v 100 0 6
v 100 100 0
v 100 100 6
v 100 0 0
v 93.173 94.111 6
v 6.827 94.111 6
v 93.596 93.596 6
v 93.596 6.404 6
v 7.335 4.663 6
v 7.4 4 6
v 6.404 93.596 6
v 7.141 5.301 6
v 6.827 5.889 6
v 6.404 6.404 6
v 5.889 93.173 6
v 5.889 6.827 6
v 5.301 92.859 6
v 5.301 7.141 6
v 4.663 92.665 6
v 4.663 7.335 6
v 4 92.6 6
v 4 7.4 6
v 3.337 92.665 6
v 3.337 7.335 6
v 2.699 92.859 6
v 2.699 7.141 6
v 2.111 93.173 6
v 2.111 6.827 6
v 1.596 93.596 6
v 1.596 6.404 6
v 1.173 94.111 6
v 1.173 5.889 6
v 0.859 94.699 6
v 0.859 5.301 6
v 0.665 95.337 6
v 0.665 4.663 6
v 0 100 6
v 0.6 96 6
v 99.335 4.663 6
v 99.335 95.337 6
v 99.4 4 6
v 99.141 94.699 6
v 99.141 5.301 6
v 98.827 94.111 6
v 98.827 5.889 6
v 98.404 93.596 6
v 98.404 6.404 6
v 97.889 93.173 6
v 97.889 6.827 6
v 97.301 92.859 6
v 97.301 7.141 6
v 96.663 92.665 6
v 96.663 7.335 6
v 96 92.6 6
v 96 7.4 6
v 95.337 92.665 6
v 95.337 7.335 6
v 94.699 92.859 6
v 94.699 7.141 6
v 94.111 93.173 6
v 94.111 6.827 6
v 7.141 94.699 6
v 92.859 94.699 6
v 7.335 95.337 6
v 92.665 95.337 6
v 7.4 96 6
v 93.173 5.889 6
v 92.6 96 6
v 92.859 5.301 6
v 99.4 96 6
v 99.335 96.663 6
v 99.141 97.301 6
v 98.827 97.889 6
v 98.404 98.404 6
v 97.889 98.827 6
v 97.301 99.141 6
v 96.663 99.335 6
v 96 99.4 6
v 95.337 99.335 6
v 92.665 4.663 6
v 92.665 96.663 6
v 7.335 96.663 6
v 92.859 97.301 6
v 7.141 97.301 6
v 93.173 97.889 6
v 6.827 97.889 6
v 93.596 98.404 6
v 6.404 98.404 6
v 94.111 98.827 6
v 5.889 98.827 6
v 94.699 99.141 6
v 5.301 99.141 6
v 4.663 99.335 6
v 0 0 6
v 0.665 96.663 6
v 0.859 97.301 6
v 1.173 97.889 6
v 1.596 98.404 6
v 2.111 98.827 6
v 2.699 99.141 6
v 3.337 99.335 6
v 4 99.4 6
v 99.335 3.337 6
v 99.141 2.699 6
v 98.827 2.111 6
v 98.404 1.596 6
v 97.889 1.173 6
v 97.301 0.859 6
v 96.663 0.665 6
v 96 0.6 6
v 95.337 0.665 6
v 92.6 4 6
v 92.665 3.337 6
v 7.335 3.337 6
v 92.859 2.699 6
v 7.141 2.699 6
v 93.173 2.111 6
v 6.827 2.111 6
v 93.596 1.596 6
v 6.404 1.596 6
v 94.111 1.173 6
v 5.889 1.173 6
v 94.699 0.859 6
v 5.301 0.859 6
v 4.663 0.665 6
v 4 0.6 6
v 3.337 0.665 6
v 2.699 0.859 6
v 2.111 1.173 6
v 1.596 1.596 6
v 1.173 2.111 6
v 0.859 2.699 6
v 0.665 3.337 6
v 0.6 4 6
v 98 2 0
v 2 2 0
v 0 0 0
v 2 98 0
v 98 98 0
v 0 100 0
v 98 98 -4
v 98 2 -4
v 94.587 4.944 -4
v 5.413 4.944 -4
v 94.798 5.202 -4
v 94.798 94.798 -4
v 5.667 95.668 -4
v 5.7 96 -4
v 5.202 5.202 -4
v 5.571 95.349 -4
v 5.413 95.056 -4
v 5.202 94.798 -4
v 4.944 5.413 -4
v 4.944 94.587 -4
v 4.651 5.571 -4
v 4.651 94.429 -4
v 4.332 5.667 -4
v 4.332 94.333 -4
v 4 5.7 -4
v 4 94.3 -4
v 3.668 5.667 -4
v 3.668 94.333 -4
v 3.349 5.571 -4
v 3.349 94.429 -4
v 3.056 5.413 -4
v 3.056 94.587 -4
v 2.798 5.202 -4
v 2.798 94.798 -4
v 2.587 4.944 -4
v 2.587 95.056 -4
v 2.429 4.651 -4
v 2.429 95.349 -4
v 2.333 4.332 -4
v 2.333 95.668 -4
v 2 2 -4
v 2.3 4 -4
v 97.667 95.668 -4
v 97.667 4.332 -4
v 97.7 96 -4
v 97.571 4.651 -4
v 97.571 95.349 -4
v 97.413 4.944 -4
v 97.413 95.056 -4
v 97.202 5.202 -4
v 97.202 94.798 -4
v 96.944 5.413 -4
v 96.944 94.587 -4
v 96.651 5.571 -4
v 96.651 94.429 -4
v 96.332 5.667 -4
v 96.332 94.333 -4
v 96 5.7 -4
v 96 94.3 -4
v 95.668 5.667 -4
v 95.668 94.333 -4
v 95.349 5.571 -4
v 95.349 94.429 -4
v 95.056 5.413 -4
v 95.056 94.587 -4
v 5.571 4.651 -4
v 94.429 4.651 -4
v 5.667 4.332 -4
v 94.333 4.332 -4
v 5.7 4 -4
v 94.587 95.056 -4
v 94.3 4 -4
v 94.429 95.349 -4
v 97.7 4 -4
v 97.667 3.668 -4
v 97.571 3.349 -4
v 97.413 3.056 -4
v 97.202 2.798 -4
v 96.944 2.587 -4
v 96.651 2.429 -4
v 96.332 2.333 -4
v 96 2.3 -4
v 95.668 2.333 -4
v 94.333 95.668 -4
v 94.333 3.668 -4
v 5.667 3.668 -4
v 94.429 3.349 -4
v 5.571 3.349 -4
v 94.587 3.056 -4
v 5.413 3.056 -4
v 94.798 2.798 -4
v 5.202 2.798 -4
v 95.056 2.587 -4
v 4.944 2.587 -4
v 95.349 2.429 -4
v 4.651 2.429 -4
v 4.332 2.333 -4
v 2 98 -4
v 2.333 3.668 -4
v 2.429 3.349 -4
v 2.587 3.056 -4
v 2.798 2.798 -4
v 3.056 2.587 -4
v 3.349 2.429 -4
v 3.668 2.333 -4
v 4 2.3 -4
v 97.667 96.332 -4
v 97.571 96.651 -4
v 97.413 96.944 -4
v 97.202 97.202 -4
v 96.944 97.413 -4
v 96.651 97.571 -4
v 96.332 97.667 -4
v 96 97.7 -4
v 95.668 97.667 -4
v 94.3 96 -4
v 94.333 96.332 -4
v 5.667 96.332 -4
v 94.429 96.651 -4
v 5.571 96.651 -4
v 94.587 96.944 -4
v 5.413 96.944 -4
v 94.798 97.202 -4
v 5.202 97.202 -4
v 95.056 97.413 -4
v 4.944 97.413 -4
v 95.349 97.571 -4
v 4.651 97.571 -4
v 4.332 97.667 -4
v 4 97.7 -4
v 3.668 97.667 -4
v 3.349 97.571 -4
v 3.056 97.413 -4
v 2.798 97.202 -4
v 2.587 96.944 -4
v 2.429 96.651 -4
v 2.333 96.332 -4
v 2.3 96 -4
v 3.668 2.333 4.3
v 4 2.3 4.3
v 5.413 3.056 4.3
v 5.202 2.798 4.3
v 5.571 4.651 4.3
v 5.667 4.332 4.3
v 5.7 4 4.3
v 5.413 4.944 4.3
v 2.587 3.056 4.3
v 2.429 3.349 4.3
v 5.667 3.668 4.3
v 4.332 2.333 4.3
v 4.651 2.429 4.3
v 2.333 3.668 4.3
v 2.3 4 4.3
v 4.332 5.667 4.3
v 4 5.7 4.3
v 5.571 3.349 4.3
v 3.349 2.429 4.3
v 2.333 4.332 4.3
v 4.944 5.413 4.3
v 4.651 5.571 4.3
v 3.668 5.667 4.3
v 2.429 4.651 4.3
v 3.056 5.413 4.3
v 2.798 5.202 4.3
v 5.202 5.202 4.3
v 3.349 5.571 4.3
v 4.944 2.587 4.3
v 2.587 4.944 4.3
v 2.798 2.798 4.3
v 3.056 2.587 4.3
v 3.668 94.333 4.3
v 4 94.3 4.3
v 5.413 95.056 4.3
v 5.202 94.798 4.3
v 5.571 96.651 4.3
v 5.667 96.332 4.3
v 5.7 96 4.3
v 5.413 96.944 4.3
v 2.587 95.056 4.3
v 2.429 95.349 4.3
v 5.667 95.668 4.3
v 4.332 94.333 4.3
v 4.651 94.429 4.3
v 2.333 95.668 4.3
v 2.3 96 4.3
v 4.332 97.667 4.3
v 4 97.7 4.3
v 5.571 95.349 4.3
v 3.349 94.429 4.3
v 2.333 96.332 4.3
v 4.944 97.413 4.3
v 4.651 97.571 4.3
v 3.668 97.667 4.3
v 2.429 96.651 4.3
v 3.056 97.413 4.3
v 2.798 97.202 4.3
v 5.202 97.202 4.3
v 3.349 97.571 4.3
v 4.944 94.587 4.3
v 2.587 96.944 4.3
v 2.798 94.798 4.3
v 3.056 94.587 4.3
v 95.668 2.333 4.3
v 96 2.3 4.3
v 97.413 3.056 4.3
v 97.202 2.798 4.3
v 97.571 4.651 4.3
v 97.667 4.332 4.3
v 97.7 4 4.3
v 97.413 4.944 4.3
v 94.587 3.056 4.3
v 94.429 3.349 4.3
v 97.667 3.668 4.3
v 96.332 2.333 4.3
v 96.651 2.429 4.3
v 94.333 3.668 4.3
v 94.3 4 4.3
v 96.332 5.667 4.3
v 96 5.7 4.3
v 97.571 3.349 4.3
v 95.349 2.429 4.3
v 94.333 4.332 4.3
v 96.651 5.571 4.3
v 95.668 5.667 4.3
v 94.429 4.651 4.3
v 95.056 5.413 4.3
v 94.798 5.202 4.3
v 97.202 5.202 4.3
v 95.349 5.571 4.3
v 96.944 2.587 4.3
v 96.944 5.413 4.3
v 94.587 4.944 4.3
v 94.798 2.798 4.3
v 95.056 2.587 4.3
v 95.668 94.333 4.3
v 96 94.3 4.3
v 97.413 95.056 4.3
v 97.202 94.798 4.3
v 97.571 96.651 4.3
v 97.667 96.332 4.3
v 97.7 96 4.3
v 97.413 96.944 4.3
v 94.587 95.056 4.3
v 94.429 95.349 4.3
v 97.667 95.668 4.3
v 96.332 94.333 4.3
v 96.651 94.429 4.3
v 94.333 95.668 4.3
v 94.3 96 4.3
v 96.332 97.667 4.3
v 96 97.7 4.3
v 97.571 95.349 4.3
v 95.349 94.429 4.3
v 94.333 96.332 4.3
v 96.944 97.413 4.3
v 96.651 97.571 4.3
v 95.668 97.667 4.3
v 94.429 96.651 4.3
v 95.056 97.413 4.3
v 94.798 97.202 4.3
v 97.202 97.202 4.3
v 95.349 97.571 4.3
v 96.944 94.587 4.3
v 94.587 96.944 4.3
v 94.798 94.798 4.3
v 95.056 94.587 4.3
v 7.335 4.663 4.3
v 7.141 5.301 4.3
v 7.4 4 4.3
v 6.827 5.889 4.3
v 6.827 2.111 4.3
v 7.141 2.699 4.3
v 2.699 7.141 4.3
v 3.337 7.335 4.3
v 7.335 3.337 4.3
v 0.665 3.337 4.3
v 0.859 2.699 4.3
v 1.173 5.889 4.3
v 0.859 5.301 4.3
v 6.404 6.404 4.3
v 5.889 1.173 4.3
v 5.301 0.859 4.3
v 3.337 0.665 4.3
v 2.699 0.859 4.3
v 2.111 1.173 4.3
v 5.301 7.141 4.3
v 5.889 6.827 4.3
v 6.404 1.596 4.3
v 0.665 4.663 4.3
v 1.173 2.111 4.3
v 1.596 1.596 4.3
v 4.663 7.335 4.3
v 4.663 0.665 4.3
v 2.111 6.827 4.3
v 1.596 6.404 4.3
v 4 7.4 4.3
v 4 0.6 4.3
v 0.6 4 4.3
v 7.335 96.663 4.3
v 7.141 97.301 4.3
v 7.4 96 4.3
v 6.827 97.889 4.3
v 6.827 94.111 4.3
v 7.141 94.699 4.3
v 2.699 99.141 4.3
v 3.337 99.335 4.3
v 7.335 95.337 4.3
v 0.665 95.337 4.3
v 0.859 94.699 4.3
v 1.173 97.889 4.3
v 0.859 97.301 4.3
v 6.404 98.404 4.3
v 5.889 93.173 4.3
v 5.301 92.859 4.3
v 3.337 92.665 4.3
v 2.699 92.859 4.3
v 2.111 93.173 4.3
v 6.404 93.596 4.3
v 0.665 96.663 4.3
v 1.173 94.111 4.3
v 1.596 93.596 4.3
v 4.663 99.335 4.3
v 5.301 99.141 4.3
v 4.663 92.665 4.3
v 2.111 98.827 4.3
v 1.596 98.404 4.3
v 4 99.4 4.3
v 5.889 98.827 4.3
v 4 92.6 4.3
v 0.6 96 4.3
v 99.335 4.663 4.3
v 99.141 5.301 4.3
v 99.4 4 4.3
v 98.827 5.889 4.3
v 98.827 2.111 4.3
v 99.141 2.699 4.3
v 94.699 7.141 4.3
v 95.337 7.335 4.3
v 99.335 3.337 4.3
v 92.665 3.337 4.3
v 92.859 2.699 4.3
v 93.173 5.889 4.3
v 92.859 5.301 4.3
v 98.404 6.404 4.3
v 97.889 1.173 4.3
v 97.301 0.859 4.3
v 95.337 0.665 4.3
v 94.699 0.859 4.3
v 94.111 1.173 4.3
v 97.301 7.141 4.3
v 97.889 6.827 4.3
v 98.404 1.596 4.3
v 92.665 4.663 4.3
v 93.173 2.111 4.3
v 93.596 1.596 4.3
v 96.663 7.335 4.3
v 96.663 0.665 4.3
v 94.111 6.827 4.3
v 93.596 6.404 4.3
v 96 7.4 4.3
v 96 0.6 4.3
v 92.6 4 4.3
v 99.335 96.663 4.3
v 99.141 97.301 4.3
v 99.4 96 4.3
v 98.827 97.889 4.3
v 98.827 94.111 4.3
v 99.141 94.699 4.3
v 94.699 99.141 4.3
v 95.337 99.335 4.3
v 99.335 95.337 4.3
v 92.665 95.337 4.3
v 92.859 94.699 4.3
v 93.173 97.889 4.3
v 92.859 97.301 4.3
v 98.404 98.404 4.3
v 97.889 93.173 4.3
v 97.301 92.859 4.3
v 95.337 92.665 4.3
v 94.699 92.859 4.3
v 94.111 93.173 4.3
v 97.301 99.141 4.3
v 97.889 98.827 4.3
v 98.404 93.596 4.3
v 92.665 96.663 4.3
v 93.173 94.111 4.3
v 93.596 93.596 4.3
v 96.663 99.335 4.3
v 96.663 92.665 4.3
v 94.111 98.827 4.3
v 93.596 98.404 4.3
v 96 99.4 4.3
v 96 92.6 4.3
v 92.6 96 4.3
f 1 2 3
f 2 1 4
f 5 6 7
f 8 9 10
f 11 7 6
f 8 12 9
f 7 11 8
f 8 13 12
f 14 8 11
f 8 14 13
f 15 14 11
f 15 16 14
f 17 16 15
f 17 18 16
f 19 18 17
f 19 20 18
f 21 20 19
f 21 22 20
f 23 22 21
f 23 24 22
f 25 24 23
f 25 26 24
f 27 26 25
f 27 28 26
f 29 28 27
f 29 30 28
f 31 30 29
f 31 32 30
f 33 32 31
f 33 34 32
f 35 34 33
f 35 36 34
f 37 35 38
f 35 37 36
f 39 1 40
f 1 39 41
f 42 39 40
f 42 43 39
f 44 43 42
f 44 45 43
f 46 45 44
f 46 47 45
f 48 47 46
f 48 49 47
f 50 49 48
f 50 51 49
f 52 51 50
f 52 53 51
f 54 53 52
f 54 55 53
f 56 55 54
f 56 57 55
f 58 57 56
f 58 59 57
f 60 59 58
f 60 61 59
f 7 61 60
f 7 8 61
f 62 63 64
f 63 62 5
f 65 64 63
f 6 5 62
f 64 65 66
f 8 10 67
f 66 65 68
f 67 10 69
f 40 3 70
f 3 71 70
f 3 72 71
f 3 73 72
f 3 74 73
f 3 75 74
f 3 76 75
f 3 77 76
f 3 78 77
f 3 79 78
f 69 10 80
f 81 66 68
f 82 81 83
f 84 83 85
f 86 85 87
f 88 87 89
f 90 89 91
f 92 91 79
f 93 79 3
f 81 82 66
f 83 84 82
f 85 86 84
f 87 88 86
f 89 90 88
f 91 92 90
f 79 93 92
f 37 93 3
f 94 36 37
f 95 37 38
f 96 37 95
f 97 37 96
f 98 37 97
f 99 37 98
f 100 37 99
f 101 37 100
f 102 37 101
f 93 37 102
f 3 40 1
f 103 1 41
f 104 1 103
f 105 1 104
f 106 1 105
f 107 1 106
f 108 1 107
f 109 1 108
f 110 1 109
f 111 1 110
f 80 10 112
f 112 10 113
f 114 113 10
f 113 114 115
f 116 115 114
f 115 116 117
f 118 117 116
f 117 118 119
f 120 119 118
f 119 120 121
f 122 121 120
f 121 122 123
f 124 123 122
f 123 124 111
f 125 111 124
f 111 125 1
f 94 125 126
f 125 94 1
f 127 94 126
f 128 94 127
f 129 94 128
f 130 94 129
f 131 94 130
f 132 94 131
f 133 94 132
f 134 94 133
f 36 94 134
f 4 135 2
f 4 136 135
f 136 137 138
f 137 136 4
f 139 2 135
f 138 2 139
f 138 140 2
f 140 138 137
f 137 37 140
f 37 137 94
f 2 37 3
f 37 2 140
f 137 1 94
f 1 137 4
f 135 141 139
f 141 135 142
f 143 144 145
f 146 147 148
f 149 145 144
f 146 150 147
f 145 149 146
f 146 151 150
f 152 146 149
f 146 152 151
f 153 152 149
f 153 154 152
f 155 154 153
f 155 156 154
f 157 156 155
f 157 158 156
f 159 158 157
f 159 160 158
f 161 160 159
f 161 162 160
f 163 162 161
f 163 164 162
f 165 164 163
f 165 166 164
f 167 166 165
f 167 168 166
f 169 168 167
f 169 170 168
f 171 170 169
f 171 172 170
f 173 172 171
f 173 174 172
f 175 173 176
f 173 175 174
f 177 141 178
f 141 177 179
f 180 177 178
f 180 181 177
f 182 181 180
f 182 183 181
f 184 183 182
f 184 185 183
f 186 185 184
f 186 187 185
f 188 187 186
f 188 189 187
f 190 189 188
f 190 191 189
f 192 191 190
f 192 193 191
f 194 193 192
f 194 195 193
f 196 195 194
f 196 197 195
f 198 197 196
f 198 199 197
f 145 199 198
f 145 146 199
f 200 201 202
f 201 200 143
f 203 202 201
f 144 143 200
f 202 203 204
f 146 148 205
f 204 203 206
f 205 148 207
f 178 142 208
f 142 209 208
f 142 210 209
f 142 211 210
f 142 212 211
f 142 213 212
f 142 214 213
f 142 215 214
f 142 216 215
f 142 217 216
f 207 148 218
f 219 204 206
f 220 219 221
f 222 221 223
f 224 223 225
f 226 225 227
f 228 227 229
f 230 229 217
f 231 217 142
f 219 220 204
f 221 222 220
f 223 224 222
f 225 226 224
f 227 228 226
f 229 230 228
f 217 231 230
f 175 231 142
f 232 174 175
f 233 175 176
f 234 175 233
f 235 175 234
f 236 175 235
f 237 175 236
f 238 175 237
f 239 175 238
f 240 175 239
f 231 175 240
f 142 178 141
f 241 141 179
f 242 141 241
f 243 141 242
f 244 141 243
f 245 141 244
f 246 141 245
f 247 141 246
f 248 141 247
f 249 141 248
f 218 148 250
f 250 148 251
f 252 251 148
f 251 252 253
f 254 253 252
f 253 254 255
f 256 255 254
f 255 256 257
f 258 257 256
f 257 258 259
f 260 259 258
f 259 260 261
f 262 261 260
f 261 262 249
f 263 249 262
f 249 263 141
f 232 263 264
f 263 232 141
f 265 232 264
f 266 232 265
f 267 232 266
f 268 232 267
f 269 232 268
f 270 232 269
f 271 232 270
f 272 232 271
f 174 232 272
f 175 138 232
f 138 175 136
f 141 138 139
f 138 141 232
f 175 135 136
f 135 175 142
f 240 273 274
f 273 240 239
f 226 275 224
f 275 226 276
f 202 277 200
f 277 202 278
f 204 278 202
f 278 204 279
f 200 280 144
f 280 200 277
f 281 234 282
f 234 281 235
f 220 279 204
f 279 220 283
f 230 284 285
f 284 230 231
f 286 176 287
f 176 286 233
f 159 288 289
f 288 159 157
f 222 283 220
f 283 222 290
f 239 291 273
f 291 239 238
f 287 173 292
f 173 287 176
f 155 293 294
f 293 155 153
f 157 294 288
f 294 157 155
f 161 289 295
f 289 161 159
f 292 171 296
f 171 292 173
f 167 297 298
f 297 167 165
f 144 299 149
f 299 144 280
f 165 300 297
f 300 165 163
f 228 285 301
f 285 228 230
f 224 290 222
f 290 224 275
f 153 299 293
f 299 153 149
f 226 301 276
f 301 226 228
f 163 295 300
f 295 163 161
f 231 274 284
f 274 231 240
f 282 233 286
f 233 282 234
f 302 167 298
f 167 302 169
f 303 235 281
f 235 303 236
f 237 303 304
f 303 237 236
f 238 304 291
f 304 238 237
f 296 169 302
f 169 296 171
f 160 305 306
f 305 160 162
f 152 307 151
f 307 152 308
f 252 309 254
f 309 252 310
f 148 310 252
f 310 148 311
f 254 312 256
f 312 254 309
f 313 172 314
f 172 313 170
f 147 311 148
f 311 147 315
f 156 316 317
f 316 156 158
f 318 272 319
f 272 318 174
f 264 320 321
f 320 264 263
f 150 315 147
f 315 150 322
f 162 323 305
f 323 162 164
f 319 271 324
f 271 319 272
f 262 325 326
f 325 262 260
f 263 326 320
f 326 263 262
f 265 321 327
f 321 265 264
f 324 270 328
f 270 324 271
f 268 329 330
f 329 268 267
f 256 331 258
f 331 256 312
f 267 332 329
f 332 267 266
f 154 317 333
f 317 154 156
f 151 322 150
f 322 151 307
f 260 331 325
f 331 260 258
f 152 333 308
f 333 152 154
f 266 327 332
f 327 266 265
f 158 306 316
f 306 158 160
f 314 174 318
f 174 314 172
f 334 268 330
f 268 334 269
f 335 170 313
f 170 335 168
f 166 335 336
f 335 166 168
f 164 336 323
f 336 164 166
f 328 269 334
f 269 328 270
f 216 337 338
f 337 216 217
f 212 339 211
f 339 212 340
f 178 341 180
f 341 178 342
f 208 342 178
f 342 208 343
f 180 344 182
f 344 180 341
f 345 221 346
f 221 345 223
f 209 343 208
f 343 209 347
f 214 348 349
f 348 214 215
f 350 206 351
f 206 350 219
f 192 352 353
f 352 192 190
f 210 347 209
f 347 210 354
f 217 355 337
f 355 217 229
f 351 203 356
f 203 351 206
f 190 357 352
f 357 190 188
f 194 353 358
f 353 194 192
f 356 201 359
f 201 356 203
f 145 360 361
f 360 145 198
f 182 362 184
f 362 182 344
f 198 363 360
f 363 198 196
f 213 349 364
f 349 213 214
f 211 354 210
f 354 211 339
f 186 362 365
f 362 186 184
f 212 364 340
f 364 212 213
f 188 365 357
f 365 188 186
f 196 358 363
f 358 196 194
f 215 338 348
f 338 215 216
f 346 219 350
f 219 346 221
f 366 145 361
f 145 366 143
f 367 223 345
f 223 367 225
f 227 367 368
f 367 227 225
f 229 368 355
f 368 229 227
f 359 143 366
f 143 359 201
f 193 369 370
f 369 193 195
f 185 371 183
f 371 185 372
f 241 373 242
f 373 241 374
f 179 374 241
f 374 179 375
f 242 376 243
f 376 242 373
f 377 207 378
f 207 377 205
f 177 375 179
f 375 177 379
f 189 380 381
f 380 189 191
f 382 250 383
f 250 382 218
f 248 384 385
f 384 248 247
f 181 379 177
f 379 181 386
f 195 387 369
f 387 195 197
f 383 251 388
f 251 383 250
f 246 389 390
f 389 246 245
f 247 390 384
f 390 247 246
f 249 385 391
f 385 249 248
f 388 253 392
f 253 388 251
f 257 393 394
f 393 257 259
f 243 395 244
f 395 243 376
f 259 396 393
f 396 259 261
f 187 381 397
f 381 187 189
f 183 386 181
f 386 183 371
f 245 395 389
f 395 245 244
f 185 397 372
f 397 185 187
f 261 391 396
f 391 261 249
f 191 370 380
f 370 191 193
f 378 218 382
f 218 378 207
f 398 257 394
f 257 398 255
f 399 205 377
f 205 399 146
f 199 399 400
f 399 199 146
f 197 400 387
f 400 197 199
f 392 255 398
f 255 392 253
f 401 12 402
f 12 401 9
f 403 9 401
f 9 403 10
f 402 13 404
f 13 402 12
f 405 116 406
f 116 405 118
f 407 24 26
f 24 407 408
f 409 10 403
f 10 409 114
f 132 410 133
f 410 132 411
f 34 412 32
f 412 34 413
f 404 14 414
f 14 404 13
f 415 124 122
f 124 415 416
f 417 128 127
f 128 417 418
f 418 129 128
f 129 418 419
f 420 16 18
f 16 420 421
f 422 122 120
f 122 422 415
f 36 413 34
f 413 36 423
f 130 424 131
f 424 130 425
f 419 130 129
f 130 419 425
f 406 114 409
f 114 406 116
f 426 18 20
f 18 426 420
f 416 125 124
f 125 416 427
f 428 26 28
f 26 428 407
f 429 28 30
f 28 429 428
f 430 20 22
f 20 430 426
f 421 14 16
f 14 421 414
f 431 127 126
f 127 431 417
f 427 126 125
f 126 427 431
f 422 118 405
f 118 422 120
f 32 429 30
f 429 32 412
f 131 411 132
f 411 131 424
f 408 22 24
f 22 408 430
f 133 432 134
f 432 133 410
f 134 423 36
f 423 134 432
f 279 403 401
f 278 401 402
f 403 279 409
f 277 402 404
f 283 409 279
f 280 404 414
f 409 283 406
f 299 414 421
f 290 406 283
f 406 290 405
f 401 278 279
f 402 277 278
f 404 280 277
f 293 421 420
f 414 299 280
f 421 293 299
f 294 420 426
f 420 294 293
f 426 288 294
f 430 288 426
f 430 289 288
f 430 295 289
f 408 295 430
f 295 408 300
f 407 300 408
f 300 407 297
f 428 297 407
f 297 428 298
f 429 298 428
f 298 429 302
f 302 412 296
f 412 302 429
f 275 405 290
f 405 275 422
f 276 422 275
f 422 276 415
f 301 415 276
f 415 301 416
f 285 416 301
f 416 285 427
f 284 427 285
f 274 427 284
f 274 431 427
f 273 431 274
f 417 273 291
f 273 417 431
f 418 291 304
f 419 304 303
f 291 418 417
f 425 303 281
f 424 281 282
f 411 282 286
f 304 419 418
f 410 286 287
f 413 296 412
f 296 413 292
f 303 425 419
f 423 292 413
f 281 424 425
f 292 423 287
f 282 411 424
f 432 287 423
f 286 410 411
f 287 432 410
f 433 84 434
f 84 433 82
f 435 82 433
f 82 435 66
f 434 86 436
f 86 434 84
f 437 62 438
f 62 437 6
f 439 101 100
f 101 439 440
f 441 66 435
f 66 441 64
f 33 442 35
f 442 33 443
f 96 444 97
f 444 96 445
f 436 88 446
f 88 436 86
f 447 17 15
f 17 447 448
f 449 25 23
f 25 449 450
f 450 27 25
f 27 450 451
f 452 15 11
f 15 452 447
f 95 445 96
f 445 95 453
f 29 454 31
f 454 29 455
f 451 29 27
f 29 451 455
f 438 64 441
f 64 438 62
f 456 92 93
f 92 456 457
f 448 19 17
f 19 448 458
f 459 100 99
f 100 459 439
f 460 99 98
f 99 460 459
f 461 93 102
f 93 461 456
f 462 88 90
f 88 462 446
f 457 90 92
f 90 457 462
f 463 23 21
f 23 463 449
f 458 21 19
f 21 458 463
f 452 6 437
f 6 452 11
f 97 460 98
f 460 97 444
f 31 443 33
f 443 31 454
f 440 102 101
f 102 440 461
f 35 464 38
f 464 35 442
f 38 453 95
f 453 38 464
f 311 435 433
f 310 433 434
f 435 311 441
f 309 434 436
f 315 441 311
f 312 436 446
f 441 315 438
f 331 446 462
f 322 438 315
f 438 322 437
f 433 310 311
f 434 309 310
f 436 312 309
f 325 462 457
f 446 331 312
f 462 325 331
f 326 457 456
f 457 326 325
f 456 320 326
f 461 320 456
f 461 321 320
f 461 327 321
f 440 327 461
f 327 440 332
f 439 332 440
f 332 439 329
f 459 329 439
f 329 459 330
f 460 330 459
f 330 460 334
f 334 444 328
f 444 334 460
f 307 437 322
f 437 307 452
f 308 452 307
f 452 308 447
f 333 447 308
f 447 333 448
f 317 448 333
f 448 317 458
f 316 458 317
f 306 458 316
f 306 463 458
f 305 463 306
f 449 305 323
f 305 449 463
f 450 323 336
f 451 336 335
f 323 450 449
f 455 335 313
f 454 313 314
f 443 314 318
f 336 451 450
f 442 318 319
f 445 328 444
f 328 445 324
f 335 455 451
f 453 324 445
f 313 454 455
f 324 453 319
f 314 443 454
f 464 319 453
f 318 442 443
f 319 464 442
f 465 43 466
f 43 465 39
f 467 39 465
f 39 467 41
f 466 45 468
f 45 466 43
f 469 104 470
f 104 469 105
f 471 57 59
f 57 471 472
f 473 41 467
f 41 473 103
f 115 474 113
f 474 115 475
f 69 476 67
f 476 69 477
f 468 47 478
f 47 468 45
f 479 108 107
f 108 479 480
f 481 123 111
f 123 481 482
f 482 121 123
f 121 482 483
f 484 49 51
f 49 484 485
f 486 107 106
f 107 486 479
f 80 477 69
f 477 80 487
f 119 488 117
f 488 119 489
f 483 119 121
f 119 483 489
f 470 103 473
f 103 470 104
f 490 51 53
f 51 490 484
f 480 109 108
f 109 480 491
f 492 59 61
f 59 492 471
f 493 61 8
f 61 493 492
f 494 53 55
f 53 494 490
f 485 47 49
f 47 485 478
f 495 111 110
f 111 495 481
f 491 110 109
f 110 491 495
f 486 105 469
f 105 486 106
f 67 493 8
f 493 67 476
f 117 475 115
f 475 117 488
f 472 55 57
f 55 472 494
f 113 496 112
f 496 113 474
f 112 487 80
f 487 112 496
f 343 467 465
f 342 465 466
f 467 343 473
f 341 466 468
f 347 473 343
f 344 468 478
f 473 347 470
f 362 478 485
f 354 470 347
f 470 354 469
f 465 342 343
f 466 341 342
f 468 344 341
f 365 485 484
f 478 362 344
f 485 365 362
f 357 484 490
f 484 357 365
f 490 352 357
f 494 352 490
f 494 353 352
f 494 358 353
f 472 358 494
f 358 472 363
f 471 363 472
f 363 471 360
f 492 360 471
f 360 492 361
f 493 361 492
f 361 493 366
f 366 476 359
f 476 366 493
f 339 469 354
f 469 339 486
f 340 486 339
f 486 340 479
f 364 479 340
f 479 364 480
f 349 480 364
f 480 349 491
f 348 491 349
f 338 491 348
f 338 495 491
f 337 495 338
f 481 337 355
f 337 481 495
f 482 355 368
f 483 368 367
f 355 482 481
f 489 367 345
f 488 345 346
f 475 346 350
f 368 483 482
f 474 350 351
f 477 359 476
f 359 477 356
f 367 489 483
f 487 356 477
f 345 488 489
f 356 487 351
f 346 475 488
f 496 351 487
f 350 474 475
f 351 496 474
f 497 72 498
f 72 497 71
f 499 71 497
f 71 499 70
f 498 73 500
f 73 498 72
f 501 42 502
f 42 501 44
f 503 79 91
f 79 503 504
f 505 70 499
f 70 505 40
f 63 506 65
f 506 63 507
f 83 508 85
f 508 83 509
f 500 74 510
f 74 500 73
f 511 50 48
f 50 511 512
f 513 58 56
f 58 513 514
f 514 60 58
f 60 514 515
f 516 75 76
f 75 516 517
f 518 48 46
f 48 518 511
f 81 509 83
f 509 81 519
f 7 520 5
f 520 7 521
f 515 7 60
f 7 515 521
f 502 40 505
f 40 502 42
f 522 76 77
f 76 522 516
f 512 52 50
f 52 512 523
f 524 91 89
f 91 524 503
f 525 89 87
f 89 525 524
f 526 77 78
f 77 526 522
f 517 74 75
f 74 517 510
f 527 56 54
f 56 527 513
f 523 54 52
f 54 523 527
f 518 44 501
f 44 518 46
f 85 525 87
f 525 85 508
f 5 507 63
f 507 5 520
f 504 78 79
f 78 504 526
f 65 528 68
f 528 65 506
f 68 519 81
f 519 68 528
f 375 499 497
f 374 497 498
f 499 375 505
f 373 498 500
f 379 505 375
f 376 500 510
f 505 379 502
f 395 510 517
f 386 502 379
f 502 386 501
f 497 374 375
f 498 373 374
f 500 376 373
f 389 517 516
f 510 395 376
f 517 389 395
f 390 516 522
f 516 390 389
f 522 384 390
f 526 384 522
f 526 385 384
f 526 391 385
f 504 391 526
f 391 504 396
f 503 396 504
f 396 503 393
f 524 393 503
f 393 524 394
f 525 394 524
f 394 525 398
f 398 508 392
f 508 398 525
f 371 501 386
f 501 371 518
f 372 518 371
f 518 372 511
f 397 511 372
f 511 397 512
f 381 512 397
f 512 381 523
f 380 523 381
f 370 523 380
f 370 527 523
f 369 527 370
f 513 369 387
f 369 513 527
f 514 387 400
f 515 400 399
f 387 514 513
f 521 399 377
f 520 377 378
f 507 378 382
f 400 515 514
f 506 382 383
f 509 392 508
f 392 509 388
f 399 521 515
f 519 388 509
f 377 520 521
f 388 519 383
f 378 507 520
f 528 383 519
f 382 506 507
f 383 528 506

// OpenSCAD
$fn = 32;

// ----------------------------------------------------------------------
// Enclosure lid: 100 x 100 x 6 mm, 4 bolt holes
// ----------------------------------------------------------------------

// --- parameters (mm) ---
length = 100;             // lid length, X
width = 100;              // lid width, Y
plate_t = 6;              // lid plate thickness
bolt_d = 3.4;             // bolt clearance
boss_lip = 4;             // bolt hole inset from the corner
sink = 1;                 // overlap of the lip and ribs into the plate
lip_h = 5;                // lip height below the plate
lip_wall = 2;             // lip wall thickness
cs_d = 6.8;               // countersink diameter
cs_h = 1.7;               // countersink depth

module plate() {
  cube([length, width, plate_t]);
  /* lip that drops into the housing opening, sunk into the plate */
  translate([lip_wall, lip_wall, -lip_h + sink]) cube([length - 2 * lip_wall, width - 2 * lip_wall, lip_h]);
}

difference() {
  plate();
  /* bolt pattern matching the corner bosses */
  for (sx = [0, 1]) for (sy = [0, 1])
    translate([sx * (length - 2 * boss_lip) + boss_lip, sy * (width - 2 * boss_lip) + boss_lip, -lip_h - 1])
      cylinder(h = plate_t + lip_h + 2, d = bolt_d);
  /* countersinks so the heads sit flush */
  for (sx = [0, 1]) for (sy = [0, 1])
    translate([sx * (length - 2 * boss_lip) + boss_lip, sy * (width - 2 * boss_lip) + boss_lip, plate_t - cs_h])
      cylinder(h = cs_h + 0.5, d = cs_d);
}
